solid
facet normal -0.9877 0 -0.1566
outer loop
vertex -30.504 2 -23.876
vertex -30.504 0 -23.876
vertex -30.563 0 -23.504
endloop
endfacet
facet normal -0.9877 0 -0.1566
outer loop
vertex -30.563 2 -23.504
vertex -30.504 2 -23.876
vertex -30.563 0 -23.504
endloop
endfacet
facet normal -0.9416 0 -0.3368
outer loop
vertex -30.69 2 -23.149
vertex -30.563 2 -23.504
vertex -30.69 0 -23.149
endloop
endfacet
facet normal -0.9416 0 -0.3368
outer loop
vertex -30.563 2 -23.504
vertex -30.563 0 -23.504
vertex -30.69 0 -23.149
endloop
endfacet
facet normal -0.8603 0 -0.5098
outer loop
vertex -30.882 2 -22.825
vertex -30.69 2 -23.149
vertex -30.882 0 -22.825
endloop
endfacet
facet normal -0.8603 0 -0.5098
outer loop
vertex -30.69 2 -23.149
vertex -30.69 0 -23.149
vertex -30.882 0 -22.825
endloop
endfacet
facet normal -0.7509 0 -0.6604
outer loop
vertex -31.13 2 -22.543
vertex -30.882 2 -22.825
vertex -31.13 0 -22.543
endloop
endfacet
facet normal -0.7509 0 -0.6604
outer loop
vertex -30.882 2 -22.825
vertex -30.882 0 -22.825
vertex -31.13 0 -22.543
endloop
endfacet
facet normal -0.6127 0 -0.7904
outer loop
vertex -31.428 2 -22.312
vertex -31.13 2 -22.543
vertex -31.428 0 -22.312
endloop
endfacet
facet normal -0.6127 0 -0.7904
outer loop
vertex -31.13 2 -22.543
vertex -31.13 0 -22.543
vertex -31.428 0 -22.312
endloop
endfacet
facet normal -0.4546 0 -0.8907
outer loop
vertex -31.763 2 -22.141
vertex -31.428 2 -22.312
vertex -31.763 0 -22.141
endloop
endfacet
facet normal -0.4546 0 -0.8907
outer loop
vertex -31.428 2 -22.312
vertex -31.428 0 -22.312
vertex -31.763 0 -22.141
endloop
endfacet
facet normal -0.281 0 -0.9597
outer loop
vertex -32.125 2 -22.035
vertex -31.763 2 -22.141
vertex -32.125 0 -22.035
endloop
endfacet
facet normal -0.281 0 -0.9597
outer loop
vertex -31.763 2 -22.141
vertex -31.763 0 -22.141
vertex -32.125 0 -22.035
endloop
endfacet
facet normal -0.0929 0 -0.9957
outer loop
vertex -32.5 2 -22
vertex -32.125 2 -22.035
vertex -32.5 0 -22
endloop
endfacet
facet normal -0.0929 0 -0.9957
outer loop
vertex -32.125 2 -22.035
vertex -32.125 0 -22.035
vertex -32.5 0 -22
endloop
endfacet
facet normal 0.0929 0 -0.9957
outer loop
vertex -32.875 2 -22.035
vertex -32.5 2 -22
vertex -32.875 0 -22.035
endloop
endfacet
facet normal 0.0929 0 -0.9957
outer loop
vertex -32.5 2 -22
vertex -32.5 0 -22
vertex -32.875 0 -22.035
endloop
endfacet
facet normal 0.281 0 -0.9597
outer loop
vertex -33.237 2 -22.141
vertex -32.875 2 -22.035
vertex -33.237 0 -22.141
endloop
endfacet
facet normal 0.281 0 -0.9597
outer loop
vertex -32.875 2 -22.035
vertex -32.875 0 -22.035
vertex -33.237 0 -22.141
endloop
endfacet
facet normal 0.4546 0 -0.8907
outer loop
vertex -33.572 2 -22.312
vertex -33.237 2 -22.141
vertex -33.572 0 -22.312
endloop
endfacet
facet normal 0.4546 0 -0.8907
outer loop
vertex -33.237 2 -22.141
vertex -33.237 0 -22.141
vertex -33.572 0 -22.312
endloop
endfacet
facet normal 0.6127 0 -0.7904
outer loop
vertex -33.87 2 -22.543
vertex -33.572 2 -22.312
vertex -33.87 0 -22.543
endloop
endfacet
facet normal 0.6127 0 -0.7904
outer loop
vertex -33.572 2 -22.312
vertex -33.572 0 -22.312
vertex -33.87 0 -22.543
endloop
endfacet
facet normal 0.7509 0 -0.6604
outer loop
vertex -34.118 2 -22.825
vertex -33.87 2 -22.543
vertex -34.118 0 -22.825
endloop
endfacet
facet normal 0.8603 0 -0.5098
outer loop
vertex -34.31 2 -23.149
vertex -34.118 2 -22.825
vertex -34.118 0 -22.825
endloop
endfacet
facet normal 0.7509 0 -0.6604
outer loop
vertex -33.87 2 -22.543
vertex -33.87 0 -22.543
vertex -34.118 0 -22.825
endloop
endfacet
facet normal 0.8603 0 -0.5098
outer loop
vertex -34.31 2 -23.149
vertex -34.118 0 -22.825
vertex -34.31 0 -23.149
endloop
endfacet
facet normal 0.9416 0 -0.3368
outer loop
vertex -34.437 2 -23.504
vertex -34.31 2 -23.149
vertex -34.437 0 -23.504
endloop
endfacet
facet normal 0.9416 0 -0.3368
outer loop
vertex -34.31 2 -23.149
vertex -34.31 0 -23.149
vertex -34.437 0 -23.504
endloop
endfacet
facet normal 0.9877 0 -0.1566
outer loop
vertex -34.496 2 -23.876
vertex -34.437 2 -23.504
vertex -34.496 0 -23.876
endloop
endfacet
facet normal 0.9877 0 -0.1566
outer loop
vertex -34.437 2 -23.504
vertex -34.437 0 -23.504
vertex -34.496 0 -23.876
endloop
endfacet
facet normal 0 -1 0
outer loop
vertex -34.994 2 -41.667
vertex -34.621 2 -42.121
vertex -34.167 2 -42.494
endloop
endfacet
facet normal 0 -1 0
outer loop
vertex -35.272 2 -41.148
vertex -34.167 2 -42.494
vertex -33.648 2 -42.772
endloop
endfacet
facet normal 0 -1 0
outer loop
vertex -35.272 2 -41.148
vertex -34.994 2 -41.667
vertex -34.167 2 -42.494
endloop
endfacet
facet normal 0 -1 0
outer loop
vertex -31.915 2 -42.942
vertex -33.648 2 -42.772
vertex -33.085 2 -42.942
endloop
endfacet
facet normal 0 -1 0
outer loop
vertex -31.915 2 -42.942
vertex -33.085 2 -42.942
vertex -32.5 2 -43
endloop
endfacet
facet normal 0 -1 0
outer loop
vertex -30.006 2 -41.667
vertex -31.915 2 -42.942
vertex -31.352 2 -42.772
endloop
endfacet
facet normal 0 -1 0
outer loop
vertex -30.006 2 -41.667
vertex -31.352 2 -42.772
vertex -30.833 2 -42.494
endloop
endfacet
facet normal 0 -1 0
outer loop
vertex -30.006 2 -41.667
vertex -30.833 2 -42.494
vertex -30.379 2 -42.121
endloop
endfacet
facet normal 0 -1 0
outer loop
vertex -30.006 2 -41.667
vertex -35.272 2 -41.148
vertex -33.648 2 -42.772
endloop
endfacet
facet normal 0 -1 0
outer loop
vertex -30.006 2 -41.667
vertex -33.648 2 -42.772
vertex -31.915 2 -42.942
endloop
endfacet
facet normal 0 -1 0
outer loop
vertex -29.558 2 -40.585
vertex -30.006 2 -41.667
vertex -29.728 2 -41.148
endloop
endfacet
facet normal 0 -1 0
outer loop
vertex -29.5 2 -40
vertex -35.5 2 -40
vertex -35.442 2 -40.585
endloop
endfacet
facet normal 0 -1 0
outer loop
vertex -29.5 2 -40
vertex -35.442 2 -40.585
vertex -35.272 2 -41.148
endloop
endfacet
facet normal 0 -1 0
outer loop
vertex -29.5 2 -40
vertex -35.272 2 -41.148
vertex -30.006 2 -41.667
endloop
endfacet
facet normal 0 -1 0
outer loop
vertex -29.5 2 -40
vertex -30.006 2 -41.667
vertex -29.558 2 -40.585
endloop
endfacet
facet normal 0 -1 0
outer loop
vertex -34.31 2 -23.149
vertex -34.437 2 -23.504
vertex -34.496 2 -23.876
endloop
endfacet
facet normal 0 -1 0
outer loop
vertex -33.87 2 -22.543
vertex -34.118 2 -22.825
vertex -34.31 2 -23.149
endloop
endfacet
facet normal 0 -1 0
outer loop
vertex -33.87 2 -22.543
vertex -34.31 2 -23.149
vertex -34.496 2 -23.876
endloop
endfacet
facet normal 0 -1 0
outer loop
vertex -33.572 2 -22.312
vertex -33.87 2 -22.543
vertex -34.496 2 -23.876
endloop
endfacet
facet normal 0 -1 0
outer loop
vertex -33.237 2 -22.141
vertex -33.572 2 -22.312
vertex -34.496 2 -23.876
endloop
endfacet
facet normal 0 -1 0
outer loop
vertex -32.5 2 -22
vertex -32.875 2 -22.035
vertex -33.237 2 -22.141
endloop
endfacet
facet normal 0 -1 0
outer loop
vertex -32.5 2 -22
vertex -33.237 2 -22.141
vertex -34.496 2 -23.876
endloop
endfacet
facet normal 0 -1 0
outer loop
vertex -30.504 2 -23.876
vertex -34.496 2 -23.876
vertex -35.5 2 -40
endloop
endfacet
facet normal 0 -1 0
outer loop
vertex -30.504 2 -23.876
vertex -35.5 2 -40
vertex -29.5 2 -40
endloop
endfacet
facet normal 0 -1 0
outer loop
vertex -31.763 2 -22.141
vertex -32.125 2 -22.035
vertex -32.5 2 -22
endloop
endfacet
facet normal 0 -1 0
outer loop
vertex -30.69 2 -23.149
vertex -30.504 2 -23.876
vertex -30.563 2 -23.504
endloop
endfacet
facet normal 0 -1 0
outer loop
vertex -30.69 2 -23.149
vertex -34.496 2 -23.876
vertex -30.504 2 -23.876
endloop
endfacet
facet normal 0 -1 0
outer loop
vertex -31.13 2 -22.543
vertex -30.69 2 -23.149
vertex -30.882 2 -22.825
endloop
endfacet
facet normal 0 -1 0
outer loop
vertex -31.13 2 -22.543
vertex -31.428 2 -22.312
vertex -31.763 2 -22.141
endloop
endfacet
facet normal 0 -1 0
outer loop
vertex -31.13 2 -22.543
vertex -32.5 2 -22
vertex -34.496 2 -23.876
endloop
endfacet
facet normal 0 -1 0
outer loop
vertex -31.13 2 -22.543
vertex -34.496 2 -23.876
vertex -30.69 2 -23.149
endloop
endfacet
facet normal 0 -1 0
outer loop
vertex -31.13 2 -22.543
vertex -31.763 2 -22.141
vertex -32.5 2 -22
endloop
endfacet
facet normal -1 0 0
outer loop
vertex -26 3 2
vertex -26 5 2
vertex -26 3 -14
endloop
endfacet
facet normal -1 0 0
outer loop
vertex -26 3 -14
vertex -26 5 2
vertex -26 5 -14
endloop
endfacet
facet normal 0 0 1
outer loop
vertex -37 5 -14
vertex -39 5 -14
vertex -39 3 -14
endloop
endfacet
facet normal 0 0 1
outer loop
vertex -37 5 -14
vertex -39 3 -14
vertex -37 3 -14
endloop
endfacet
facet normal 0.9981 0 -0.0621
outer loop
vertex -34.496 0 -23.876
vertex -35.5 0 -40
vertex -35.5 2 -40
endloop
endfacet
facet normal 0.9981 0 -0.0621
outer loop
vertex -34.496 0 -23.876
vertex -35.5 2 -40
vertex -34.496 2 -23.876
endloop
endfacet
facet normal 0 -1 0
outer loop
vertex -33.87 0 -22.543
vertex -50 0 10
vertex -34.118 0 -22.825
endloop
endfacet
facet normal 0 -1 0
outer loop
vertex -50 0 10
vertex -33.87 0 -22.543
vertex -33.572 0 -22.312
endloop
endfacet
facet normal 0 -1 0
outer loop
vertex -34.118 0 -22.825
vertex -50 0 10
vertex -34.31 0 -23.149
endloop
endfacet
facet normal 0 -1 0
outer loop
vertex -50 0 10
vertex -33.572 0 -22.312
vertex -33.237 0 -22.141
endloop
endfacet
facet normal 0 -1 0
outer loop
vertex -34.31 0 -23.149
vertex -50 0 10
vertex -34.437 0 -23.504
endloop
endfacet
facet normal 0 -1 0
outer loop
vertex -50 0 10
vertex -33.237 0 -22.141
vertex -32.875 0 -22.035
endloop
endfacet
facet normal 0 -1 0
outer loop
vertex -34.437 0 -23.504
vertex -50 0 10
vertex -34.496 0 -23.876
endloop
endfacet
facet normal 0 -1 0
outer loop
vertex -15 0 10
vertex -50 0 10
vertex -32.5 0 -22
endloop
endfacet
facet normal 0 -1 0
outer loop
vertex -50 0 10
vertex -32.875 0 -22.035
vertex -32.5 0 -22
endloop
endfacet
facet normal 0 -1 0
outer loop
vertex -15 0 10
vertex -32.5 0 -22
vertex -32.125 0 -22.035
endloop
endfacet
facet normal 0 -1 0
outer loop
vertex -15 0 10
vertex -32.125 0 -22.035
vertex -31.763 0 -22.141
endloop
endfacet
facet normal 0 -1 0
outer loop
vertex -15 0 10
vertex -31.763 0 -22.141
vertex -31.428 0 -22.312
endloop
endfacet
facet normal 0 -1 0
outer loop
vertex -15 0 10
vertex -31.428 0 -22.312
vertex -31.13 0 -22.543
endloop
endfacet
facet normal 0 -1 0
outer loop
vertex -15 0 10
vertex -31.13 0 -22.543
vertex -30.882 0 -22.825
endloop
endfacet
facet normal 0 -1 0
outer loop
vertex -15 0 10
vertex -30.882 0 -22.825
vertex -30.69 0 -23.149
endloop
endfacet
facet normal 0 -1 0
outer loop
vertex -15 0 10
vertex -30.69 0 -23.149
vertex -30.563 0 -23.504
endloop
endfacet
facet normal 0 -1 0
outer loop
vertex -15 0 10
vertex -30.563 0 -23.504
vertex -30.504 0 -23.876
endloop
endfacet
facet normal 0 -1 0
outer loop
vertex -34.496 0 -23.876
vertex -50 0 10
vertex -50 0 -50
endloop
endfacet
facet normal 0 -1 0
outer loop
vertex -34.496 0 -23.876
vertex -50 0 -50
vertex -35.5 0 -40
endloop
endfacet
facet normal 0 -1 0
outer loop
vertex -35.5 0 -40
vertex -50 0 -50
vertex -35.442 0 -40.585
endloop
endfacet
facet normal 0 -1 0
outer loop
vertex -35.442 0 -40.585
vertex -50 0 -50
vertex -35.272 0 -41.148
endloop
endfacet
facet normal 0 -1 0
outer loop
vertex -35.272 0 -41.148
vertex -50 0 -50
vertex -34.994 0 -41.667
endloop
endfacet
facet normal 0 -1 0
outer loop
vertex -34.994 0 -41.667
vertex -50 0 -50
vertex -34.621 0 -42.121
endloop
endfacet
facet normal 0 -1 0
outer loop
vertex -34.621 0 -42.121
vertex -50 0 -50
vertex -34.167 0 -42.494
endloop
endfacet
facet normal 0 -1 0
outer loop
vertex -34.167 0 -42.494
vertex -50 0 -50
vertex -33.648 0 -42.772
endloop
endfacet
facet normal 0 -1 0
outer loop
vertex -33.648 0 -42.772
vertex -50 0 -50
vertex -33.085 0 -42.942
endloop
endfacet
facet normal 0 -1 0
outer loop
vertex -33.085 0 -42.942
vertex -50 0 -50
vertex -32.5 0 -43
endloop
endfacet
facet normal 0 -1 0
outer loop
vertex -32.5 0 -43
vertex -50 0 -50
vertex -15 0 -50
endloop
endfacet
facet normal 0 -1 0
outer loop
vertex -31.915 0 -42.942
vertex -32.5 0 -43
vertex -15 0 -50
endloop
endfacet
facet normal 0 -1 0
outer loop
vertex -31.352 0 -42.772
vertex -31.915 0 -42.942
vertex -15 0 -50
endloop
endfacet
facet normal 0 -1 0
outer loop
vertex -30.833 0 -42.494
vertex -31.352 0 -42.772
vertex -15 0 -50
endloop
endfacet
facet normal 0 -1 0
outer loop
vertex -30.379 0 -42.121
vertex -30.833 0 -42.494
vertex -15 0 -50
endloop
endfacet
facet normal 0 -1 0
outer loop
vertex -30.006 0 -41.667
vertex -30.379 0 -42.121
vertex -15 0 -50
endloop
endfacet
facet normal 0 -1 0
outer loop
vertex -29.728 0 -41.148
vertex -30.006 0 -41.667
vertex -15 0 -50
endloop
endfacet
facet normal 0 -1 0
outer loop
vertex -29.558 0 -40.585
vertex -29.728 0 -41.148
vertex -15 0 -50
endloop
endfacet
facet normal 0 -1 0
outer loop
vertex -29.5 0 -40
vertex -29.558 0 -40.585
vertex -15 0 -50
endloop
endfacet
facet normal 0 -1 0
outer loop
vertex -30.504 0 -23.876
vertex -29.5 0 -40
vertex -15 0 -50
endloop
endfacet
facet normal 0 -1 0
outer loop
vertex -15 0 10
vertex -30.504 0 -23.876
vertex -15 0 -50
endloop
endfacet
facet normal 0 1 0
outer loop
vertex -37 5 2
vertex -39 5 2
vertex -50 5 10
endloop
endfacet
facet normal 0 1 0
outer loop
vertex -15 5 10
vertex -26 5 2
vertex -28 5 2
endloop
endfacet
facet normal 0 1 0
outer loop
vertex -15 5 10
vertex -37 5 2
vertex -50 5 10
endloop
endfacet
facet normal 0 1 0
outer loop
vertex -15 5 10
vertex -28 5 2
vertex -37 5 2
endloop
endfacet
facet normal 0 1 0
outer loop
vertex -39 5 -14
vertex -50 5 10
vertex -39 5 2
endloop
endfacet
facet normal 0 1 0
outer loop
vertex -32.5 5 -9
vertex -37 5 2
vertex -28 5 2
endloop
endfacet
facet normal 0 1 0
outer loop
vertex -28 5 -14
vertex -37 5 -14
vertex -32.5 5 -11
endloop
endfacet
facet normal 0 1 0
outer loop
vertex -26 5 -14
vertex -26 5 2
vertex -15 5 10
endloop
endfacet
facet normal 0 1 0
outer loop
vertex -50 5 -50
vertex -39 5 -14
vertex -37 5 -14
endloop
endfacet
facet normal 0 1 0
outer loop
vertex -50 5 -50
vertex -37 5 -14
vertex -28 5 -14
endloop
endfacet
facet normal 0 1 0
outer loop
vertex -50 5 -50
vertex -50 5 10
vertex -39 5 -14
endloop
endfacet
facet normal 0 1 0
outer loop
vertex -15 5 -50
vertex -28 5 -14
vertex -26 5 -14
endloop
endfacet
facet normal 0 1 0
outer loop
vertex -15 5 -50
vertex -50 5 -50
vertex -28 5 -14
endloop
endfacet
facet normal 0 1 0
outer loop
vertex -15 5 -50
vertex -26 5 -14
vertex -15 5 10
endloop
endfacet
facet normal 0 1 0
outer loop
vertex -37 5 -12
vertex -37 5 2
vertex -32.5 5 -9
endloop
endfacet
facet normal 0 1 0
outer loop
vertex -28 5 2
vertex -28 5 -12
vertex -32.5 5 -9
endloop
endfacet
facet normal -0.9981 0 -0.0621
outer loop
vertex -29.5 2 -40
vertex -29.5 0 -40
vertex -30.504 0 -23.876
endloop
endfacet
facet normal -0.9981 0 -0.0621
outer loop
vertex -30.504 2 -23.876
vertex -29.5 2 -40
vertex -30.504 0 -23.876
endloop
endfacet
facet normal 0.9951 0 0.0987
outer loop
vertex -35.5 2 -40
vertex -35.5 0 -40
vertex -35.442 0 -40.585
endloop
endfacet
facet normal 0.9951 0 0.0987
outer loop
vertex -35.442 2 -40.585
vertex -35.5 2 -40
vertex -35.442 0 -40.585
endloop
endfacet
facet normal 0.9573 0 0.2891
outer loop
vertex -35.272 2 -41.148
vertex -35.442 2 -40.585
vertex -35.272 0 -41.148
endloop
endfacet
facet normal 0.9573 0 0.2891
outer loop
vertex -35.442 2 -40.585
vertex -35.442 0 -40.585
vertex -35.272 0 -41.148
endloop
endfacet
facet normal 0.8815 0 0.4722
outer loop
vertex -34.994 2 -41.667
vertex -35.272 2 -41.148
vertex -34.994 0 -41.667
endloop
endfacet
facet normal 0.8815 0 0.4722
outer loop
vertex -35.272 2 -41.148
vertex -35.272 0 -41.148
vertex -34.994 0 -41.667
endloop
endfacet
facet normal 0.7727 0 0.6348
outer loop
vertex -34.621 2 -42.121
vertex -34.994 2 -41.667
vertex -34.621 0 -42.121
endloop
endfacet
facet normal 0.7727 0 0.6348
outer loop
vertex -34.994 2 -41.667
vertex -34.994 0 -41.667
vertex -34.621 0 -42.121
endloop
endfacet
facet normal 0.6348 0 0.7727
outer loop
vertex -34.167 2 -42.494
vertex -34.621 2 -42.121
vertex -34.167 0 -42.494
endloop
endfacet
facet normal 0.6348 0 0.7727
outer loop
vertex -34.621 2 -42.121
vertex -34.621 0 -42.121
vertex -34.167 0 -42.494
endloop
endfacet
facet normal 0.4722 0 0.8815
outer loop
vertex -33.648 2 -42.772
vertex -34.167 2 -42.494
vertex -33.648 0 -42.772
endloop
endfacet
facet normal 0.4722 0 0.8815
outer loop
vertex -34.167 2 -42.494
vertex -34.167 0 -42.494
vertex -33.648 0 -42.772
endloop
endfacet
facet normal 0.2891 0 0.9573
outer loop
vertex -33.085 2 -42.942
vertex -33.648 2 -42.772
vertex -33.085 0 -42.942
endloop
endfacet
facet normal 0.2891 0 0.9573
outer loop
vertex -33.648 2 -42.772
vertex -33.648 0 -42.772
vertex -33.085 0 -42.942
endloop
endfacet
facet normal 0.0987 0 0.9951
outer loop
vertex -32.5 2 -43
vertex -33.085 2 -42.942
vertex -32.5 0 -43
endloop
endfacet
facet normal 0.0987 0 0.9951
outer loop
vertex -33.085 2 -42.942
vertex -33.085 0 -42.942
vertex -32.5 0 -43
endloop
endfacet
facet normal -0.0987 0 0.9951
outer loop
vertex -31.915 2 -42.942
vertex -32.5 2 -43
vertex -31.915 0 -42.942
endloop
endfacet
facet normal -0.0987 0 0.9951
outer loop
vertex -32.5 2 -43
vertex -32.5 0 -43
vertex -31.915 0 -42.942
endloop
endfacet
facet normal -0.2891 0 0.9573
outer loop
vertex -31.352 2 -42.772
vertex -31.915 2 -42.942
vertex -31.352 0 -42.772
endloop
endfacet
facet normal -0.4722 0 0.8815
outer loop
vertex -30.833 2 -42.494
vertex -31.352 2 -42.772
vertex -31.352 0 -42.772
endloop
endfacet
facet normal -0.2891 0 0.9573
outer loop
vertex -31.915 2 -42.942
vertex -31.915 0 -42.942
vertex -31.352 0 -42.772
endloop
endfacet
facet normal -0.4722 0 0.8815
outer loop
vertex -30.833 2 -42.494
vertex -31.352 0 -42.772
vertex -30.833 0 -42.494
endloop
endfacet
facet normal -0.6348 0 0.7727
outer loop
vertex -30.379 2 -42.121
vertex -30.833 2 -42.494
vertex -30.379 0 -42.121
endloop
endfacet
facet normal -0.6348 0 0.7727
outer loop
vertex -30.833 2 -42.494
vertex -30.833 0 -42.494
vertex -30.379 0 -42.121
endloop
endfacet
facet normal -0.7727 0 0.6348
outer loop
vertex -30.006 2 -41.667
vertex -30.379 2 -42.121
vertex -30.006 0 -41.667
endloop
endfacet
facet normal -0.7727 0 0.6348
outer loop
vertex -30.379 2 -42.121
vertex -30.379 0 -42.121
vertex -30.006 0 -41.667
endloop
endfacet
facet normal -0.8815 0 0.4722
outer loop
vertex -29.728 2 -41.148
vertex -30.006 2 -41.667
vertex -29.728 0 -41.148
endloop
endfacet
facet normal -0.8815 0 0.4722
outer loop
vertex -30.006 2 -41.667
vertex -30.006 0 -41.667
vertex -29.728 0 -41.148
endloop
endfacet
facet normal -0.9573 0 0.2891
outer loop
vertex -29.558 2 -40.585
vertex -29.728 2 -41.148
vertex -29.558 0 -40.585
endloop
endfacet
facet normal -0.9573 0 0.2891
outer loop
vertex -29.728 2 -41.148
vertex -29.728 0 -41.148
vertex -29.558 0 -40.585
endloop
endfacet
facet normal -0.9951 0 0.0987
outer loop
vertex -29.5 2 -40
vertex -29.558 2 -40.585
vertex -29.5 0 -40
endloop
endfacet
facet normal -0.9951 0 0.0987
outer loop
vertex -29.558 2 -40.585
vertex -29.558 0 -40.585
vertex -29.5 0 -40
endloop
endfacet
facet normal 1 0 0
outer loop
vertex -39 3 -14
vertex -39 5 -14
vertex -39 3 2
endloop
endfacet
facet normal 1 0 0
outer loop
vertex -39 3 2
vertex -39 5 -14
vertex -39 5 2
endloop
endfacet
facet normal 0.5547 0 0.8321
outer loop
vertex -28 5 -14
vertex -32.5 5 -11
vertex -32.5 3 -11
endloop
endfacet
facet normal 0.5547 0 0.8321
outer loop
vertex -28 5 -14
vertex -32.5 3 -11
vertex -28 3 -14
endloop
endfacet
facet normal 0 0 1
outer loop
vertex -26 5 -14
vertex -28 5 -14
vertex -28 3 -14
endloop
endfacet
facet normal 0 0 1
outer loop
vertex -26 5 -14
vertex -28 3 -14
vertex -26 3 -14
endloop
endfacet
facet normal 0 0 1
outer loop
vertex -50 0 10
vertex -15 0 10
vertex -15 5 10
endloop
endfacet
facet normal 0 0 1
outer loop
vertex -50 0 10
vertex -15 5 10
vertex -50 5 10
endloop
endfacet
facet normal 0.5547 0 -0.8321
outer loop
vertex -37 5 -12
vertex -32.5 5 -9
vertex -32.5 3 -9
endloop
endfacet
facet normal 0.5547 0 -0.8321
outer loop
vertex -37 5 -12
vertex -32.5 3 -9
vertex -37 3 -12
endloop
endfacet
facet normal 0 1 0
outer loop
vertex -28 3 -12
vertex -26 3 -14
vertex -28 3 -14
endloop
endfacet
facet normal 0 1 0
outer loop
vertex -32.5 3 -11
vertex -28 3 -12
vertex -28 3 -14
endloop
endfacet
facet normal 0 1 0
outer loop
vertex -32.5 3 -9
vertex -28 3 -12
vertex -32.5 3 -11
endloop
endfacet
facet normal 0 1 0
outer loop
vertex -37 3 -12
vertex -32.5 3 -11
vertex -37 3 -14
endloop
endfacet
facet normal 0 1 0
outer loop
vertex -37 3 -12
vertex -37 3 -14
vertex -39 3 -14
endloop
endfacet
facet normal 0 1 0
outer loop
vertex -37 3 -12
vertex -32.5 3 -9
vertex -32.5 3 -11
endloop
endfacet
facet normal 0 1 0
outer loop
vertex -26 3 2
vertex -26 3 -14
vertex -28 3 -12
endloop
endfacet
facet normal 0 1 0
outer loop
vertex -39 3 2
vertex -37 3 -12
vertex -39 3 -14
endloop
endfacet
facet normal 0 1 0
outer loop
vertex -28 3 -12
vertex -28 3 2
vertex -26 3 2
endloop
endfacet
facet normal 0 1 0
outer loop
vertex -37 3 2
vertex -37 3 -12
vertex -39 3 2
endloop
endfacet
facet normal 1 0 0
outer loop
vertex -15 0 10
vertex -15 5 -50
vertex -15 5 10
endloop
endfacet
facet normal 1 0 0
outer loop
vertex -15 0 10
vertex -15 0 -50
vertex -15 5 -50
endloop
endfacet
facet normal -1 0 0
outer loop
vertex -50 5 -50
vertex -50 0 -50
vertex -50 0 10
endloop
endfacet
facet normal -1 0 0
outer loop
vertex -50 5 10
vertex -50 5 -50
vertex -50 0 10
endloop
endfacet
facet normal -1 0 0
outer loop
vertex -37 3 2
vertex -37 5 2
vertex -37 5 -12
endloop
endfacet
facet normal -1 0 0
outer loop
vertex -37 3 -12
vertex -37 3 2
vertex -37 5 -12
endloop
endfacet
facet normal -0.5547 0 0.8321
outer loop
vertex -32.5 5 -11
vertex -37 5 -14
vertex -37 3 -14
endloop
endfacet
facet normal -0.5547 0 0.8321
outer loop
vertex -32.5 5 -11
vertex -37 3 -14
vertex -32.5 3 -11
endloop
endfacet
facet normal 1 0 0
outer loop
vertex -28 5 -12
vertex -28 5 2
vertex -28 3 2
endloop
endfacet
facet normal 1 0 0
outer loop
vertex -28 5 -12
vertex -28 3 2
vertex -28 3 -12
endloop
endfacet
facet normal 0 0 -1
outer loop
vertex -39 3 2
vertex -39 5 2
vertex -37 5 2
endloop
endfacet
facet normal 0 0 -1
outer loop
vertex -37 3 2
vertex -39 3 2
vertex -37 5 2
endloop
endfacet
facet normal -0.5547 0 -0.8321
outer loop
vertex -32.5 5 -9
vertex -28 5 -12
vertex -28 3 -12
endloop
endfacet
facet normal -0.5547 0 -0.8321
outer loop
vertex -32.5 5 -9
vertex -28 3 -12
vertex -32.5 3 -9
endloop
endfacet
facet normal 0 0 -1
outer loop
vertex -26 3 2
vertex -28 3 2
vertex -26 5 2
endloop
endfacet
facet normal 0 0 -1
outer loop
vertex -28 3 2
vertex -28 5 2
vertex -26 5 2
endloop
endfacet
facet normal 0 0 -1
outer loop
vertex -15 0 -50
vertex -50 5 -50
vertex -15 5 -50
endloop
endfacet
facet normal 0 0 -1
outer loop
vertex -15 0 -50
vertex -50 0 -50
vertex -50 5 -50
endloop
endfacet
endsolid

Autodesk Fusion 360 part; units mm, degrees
sketch "Boceto1" plane through (0, 0, 0) normal (0, 1, 0) x (1, 0, 0)
  line L0 (-50, 50) -> (-50, -10)
  line L1 (-50, 50) -> (-15, 50)
  line L2 (-15, 50) -> (-15, -10)
  line L3 (-15, -10) -> (-50, -10)
  dimension "d1" = 60
  dimension "d2" = 35
extrude "Extruir1" add sketch "Boceto1" along normal blind 3
sketch "Boceto2" plane through (0, 0, 0) normal (0, -1, 0) x (1, 0, 0)
  line L0 (-50, 10) -> (-50, -50)
  line L1 (-50, -50) -> (-15, -50)
  line L2 (-15, -50) -> (-15, 10)
  line L3 (-15, 10) -> (-50, 10)
  line L4 (-35.5, -40) -> (-34.4961, -23.8757)
  line L5 (-29.5, -40) -> (-30.5039, -23.8757)
  arc A0 (-30.5039, -23.8757) -> (-34.4961, -23.8757) centre (-32.5, -24) ccw
  arc A1 (-35.5, -40) -> (-29.5, -40) centre (-32.5, -40) ccw
  arc A2 (-35.5, -40) -> (-29.5, -40) centre (-32.5, -40) ccw
extrude "Extruir2" add 1 faces at (-38.3333, 3, -30) along direction (0, 1, 0) blind 2
extrude "Extruir3" cut sketch "Boceto2" against normal blind 2 contours L4 L5 A0 A1 A2
sketch "Boceto3" plane through (0, 5, 0) normal (0, 1, 0) x (-1, 0, 0)
  line L0 (50, -50) -> (50, 10)
  line L1 (50, 10) -> (15, 10)
  line L2 (15, 10) -> (15, -50)
  line L3 (15, -50) -> (50, -50)
  line L4 (39, -12) -> (39, 2)
  line L5 (39, 2) -> (37, 2)
  line L6 (37, 2) -> (37, -12)
  line L7 (50, 10) -> (32.5, 10)
  line L8 (32.5, -9) -> (37, -12)
  line L9 (28, 2) -> (26, 2)
  line L10 (26, 2) -> (26, -12)
  line L11 (28, 2) -> (28, -12)
  line L12 (28, -12) -> (32.5, -9)
  line L13 (39, -12) -> (39, -14)
  line L14 (39, -14) -> (37, -14)
  line L15 (37, -14) -> (32.5, -11)
  line L16 (32.5, -11) -> (28, -14)
  line L17 (28, -14) -> (26, -14)
  line L18 (26, -14) -> (26, -12)
extrude "Extruir4" cut sketch "Boceto3" against normal blind 2 contours L4 L5 L6 L8 L9 L10 L11 L12 L13 L14 L15 L16 L17 L18
